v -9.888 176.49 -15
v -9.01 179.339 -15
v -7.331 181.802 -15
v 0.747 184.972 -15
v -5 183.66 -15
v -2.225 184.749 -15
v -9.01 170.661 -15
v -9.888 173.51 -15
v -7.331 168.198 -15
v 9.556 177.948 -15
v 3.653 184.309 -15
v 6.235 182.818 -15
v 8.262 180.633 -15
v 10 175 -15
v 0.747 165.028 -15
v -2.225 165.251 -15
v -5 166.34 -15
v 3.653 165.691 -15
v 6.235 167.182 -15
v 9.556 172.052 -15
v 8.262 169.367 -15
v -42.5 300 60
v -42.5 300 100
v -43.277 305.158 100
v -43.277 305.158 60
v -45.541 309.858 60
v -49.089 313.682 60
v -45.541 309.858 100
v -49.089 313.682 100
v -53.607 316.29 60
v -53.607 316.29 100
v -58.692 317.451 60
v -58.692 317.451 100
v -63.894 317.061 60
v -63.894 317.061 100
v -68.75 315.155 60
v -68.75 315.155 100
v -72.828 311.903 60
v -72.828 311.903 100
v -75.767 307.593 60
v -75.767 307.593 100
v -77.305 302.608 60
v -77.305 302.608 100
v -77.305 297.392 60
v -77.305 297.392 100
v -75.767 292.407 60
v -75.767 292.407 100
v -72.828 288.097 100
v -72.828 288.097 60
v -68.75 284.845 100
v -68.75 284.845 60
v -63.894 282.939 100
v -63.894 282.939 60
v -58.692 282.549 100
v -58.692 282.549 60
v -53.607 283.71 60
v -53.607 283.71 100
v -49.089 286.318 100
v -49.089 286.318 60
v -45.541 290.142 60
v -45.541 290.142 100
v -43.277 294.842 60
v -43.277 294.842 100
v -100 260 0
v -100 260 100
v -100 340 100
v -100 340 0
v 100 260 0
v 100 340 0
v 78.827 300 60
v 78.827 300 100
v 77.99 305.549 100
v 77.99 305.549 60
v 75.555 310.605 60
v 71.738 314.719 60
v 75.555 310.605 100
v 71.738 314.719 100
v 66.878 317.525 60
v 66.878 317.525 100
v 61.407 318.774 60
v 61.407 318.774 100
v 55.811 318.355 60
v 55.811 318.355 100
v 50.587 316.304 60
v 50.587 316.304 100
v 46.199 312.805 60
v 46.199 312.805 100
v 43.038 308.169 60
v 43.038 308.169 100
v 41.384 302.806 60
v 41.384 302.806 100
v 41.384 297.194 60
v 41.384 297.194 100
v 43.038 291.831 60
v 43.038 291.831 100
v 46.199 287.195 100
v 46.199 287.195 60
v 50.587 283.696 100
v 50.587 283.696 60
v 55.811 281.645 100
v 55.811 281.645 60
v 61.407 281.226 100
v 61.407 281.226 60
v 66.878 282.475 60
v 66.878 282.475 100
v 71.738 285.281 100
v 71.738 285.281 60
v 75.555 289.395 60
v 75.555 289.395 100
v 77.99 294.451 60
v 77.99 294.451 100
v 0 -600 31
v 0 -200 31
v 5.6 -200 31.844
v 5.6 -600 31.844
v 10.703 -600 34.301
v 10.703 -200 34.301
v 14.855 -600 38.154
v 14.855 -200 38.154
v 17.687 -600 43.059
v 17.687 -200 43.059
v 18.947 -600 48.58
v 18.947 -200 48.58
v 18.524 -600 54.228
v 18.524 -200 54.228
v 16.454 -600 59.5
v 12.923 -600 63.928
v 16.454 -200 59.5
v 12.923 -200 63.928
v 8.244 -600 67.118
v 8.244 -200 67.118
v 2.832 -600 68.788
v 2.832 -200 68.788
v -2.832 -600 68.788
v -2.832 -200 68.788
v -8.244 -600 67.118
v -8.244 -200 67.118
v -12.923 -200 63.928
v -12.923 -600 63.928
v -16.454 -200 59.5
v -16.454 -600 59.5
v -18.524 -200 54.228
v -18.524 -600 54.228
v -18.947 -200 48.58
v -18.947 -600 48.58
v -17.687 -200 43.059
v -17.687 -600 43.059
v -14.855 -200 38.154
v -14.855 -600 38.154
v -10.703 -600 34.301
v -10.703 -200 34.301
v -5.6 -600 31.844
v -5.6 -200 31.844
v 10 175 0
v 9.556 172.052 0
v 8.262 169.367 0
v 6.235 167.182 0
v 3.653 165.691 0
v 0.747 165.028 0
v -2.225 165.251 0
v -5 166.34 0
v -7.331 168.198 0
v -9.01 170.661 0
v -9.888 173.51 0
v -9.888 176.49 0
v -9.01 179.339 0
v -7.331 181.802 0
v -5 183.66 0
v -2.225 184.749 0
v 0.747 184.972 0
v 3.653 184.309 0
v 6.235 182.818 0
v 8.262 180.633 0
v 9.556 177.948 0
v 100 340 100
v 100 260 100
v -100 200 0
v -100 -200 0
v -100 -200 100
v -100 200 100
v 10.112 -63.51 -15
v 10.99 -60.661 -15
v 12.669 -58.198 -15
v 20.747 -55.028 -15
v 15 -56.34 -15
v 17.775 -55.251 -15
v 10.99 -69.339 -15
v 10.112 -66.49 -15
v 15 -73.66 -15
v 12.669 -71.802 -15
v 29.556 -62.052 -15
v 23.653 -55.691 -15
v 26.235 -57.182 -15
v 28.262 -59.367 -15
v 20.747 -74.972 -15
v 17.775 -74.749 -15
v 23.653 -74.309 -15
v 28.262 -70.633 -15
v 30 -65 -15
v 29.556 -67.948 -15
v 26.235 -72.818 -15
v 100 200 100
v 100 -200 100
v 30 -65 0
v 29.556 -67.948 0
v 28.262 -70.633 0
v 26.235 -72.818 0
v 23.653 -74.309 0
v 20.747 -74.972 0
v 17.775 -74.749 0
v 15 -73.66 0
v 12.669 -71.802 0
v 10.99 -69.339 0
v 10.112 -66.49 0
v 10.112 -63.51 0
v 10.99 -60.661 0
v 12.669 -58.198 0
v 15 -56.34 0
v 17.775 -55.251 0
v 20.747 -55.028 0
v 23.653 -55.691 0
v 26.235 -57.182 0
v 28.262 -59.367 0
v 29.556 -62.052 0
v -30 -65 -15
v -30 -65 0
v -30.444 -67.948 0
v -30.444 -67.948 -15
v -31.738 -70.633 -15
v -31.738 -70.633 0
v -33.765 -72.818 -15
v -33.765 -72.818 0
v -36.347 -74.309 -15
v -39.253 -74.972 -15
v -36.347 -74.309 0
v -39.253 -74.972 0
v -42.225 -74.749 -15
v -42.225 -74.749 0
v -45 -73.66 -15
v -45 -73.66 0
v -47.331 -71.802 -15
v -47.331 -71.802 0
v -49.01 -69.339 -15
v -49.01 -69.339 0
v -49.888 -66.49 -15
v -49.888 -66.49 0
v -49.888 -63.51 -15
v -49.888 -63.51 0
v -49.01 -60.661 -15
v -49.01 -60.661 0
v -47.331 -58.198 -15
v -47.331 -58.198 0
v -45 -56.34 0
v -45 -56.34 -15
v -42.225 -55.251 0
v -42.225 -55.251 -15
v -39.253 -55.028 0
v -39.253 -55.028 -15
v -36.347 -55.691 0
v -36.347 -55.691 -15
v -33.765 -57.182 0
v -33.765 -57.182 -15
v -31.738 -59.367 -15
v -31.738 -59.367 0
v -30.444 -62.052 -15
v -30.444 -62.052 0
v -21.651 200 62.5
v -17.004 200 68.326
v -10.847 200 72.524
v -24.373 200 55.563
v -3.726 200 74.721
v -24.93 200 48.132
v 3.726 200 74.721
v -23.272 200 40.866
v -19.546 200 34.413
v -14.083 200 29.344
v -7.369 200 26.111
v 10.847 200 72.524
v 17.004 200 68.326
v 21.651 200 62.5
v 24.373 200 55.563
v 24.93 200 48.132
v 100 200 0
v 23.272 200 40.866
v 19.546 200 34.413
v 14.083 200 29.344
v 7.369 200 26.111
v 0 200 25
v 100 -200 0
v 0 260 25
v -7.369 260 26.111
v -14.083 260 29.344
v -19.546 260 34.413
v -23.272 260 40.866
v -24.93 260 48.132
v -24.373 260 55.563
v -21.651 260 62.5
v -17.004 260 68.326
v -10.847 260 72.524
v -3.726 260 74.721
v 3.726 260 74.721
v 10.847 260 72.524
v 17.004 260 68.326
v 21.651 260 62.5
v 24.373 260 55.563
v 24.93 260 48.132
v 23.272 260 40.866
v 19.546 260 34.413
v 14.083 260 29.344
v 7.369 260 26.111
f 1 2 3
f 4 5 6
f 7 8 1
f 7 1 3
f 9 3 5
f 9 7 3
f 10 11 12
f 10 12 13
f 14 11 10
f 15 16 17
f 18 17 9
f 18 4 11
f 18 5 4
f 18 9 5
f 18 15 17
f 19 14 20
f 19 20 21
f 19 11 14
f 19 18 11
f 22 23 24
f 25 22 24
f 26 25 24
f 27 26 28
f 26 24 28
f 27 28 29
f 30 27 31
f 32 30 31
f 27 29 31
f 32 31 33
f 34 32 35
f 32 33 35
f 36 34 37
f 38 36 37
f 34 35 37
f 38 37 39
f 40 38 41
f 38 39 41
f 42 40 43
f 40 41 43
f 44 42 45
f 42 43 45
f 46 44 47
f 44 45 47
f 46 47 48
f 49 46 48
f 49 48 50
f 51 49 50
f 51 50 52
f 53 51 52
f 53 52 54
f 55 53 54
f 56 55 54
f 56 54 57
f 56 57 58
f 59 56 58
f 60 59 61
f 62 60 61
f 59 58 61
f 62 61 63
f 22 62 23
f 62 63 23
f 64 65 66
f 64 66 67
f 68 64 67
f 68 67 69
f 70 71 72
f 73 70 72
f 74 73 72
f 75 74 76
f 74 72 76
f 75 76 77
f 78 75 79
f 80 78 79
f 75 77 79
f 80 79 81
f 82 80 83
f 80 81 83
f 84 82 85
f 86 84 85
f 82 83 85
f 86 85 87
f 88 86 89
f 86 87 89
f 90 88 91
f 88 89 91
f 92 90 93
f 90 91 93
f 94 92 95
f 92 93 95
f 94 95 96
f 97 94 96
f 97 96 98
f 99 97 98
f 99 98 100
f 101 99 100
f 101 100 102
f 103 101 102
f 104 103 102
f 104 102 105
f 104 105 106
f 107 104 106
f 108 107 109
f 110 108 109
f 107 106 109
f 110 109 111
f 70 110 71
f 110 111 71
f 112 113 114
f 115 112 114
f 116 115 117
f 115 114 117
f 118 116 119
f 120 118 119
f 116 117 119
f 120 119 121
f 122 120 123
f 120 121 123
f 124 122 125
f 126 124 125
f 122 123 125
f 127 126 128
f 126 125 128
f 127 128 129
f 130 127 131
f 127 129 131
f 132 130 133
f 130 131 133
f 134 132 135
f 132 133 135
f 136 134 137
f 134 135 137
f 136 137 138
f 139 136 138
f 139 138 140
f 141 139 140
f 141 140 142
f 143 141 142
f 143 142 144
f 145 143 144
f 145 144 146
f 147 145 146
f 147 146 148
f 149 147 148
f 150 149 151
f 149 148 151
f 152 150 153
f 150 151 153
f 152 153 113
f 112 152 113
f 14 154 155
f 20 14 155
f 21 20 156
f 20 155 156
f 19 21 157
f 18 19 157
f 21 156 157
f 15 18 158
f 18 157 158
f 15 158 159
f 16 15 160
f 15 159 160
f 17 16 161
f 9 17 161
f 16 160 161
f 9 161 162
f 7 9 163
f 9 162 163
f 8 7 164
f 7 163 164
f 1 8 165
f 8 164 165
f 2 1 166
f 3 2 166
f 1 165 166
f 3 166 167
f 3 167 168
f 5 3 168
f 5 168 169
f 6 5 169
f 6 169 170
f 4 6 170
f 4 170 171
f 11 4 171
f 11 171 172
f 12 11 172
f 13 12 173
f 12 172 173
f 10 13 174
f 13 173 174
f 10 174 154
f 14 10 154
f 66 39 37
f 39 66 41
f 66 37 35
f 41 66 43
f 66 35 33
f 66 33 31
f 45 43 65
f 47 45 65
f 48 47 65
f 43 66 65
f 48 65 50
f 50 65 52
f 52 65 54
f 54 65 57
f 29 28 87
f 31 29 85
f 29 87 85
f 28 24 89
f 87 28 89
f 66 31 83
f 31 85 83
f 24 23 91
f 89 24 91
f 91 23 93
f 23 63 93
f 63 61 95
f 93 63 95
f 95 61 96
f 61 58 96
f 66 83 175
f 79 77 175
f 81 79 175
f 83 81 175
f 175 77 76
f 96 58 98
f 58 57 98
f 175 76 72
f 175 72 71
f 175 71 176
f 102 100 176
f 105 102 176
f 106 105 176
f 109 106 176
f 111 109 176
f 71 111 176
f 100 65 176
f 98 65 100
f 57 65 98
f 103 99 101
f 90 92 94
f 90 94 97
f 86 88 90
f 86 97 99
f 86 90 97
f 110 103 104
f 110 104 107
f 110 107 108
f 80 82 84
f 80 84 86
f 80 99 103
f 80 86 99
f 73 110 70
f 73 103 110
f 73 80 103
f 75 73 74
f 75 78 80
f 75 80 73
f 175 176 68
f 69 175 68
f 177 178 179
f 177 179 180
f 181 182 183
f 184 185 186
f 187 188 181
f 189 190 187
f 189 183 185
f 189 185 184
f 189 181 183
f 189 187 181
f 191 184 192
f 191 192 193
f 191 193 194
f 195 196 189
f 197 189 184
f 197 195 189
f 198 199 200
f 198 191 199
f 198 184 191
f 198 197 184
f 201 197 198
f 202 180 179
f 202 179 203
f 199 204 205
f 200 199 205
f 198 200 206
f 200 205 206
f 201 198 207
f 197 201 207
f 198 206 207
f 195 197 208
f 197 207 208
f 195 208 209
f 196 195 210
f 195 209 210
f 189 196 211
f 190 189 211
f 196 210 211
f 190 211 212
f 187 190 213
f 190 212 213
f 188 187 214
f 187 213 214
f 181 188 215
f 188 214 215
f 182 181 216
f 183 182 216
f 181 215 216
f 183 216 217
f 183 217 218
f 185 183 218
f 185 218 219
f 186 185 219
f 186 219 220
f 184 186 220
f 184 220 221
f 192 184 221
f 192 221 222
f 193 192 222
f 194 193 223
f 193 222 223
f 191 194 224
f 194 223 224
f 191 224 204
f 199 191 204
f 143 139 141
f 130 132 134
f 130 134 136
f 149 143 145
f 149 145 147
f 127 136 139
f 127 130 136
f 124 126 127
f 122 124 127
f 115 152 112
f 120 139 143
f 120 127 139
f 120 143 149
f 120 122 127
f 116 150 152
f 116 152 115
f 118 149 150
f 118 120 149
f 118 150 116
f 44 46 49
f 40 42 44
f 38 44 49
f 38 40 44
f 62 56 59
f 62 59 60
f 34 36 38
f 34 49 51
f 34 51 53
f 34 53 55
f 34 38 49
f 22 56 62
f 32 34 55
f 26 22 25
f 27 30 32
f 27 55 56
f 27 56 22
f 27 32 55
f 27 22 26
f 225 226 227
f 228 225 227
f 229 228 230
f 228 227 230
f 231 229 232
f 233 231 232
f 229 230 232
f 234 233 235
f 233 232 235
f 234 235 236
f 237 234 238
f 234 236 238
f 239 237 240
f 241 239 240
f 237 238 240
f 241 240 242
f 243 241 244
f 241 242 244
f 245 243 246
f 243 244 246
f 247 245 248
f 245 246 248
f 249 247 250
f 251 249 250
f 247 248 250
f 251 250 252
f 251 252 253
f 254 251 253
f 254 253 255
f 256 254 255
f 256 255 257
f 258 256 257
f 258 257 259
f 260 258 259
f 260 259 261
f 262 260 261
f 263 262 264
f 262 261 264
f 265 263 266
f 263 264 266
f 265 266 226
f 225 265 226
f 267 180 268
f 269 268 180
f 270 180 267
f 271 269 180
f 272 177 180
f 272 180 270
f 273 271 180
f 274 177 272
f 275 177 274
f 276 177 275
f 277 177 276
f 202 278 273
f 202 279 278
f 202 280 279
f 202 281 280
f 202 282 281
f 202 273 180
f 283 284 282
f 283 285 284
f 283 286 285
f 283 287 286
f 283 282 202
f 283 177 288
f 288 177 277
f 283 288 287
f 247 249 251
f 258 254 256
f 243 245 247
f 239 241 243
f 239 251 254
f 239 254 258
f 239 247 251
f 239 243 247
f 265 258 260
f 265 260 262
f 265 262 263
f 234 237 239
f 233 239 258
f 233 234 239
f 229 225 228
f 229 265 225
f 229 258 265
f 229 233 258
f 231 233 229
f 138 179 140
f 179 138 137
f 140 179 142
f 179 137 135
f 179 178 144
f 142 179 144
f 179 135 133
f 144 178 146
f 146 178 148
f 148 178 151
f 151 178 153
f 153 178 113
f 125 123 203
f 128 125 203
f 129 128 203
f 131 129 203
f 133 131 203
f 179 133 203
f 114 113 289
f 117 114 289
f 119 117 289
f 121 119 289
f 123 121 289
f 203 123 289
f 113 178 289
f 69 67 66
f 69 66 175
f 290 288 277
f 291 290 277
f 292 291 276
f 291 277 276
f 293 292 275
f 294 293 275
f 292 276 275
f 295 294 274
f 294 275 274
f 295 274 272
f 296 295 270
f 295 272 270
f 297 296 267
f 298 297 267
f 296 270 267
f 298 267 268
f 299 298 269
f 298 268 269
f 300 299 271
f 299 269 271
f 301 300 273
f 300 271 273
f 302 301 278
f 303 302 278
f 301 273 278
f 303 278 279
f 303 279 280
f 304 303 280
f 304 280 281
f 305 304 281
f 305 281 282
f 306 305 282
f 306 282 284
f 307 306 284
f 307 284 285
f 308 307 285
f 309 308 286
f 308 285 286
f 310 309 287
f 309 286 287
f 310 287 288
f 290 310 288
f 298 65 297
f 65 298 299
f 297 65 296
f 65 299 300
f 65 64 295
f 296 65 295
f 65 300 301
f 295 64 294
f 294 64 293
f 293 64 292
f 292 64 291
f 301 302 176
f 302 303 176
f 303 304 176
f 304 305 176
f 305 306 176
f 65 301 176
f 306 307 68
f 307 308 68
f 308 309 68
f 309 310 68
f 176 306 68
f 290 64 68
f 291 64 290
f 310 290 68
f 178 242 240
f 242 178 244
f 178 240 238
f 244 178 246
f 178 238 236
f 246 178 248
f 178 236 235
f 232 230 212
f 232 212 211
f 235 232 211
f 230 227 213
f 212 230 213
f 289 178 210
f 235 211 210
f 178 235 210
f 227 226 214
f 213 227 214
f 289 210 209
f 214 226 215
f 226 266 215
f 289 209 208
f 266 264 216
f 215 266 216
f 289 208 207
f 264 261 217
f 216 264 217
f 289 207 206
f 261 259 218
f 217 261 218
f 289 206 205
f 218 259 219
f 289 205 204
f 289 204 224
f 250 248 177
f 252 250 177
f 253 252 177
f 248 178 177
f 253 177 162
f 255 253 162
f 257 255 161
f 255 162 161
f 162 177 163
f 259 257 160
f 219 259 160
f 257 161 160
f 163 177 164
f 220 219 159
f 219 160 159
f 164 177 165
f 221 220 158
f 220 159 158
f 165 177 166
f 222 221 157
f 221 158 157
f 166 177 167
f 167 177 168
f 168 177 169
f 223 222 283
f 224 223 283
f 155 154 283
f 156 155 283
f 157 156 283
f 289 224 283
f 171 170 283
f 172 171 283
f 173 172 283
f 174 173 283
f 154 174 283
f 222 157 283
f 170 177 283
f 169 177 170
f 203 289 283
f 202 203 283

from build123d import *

# Parameters (mm, degrees)
SKETCH1_W           = 200
SKETCH1_H           = 400
BOSS_EXTRUDE1_DEPTH = 100
SKETCH2_R           = 25
BOSS_EXTRUDE2_DEPTH = 60
SKETCH3_W           = 200
SKETCH3_H           = 100
BOSS_EXTRUDE3_DEPTH = 80
SKETCH4_R           = 17.5
SKETCH4_R_2         = 18.82666719
CUT_EXTRUDE1_DEPTH  = 40
SKETCH5_R           = 19
BOSS_EXTRUDE4_DEPTH = 400
SKETCH7_R           = 10
BOSS_EXTRUDE5_DEPTH = 15


with BuildPart() as part:
    # Sketch1 → Boss-Extrude1 (new body)
    with BuildSketch(Plane.XY):
        Rectangle(SKETCH1_W, SKETCH1_H)
    extrude(amount=BOSS_EXTRUDE1_DEPTH)

    # Sketch2 → Boss-Extrude2 (add)
    with BuildSketch(Plane(origin=(0, 200, 0), x_dir=(1, 0, 0), z_dir=(0, 1, 0))):
        with Locations(Location((0, -50, 0), (0, 0, 90))):
            Circle(SKETCH2_R)
    extrude(amount=BOSS_EXTRUDE2_DEPTH)

    # Sketch3 → Boss-Extrude3 (add)
    with BuildSketch(Plane(origin=(0, 260, 0), x_dir=(1, 0, 0), z_dir=(0, 1, 0))):
        with Locations((0, -50)):
            Rectangle(SKETCH3_W, SKETCH3_H)
    extrude(amount=BOSS_EXTRUDE3_DEPTH)

    # Sketch4 → Cut-Extrude1 (cut)
    with BuildSketch(Plane.XY.offset(100)):
        with Locations((-60, 300)):
            Circle(SKETCH4_R)
        with Locations((60, 300)):
            Circle(SKETCH4_R_2)
    extrude(amount=-CUT_EXTRUDE1_DEPTH, mode=Mode.SUBTRACT)

    # Sketch5 → Boss-Extrude4 (add)
    with BuildSketch(Plane.XZ.offset(200)):
        with Locations(Location((0, 50, 0), (0, 0, 270))):
            Circle(SKETCH5_R)
    extrude(amount=BOSS_EXTRUDE4_DEPTH)

    # Sketch7 → Boss-Extrude5 (add)
    with BuildSketch(Plane(origin=(0, 0, 0), x_dir=(-1, 0, 0), z_dir=(0, 0, -1))):
        with Locations(Location((0, 175, 0), (0, 0, 180))):
            Circle(SKETCH7_R)
        with Locations(Location((-20, -65, 0), (0, 0, 180))):
            Circle(SKETCH7_R)
        with Locations(Location((40, -65, 0), (0, 0, 180))):
            Circle(SKETCH7_R)
    extrude(amount=BOSS_EXTRUDE5_DEPTH)


solid = part.part
